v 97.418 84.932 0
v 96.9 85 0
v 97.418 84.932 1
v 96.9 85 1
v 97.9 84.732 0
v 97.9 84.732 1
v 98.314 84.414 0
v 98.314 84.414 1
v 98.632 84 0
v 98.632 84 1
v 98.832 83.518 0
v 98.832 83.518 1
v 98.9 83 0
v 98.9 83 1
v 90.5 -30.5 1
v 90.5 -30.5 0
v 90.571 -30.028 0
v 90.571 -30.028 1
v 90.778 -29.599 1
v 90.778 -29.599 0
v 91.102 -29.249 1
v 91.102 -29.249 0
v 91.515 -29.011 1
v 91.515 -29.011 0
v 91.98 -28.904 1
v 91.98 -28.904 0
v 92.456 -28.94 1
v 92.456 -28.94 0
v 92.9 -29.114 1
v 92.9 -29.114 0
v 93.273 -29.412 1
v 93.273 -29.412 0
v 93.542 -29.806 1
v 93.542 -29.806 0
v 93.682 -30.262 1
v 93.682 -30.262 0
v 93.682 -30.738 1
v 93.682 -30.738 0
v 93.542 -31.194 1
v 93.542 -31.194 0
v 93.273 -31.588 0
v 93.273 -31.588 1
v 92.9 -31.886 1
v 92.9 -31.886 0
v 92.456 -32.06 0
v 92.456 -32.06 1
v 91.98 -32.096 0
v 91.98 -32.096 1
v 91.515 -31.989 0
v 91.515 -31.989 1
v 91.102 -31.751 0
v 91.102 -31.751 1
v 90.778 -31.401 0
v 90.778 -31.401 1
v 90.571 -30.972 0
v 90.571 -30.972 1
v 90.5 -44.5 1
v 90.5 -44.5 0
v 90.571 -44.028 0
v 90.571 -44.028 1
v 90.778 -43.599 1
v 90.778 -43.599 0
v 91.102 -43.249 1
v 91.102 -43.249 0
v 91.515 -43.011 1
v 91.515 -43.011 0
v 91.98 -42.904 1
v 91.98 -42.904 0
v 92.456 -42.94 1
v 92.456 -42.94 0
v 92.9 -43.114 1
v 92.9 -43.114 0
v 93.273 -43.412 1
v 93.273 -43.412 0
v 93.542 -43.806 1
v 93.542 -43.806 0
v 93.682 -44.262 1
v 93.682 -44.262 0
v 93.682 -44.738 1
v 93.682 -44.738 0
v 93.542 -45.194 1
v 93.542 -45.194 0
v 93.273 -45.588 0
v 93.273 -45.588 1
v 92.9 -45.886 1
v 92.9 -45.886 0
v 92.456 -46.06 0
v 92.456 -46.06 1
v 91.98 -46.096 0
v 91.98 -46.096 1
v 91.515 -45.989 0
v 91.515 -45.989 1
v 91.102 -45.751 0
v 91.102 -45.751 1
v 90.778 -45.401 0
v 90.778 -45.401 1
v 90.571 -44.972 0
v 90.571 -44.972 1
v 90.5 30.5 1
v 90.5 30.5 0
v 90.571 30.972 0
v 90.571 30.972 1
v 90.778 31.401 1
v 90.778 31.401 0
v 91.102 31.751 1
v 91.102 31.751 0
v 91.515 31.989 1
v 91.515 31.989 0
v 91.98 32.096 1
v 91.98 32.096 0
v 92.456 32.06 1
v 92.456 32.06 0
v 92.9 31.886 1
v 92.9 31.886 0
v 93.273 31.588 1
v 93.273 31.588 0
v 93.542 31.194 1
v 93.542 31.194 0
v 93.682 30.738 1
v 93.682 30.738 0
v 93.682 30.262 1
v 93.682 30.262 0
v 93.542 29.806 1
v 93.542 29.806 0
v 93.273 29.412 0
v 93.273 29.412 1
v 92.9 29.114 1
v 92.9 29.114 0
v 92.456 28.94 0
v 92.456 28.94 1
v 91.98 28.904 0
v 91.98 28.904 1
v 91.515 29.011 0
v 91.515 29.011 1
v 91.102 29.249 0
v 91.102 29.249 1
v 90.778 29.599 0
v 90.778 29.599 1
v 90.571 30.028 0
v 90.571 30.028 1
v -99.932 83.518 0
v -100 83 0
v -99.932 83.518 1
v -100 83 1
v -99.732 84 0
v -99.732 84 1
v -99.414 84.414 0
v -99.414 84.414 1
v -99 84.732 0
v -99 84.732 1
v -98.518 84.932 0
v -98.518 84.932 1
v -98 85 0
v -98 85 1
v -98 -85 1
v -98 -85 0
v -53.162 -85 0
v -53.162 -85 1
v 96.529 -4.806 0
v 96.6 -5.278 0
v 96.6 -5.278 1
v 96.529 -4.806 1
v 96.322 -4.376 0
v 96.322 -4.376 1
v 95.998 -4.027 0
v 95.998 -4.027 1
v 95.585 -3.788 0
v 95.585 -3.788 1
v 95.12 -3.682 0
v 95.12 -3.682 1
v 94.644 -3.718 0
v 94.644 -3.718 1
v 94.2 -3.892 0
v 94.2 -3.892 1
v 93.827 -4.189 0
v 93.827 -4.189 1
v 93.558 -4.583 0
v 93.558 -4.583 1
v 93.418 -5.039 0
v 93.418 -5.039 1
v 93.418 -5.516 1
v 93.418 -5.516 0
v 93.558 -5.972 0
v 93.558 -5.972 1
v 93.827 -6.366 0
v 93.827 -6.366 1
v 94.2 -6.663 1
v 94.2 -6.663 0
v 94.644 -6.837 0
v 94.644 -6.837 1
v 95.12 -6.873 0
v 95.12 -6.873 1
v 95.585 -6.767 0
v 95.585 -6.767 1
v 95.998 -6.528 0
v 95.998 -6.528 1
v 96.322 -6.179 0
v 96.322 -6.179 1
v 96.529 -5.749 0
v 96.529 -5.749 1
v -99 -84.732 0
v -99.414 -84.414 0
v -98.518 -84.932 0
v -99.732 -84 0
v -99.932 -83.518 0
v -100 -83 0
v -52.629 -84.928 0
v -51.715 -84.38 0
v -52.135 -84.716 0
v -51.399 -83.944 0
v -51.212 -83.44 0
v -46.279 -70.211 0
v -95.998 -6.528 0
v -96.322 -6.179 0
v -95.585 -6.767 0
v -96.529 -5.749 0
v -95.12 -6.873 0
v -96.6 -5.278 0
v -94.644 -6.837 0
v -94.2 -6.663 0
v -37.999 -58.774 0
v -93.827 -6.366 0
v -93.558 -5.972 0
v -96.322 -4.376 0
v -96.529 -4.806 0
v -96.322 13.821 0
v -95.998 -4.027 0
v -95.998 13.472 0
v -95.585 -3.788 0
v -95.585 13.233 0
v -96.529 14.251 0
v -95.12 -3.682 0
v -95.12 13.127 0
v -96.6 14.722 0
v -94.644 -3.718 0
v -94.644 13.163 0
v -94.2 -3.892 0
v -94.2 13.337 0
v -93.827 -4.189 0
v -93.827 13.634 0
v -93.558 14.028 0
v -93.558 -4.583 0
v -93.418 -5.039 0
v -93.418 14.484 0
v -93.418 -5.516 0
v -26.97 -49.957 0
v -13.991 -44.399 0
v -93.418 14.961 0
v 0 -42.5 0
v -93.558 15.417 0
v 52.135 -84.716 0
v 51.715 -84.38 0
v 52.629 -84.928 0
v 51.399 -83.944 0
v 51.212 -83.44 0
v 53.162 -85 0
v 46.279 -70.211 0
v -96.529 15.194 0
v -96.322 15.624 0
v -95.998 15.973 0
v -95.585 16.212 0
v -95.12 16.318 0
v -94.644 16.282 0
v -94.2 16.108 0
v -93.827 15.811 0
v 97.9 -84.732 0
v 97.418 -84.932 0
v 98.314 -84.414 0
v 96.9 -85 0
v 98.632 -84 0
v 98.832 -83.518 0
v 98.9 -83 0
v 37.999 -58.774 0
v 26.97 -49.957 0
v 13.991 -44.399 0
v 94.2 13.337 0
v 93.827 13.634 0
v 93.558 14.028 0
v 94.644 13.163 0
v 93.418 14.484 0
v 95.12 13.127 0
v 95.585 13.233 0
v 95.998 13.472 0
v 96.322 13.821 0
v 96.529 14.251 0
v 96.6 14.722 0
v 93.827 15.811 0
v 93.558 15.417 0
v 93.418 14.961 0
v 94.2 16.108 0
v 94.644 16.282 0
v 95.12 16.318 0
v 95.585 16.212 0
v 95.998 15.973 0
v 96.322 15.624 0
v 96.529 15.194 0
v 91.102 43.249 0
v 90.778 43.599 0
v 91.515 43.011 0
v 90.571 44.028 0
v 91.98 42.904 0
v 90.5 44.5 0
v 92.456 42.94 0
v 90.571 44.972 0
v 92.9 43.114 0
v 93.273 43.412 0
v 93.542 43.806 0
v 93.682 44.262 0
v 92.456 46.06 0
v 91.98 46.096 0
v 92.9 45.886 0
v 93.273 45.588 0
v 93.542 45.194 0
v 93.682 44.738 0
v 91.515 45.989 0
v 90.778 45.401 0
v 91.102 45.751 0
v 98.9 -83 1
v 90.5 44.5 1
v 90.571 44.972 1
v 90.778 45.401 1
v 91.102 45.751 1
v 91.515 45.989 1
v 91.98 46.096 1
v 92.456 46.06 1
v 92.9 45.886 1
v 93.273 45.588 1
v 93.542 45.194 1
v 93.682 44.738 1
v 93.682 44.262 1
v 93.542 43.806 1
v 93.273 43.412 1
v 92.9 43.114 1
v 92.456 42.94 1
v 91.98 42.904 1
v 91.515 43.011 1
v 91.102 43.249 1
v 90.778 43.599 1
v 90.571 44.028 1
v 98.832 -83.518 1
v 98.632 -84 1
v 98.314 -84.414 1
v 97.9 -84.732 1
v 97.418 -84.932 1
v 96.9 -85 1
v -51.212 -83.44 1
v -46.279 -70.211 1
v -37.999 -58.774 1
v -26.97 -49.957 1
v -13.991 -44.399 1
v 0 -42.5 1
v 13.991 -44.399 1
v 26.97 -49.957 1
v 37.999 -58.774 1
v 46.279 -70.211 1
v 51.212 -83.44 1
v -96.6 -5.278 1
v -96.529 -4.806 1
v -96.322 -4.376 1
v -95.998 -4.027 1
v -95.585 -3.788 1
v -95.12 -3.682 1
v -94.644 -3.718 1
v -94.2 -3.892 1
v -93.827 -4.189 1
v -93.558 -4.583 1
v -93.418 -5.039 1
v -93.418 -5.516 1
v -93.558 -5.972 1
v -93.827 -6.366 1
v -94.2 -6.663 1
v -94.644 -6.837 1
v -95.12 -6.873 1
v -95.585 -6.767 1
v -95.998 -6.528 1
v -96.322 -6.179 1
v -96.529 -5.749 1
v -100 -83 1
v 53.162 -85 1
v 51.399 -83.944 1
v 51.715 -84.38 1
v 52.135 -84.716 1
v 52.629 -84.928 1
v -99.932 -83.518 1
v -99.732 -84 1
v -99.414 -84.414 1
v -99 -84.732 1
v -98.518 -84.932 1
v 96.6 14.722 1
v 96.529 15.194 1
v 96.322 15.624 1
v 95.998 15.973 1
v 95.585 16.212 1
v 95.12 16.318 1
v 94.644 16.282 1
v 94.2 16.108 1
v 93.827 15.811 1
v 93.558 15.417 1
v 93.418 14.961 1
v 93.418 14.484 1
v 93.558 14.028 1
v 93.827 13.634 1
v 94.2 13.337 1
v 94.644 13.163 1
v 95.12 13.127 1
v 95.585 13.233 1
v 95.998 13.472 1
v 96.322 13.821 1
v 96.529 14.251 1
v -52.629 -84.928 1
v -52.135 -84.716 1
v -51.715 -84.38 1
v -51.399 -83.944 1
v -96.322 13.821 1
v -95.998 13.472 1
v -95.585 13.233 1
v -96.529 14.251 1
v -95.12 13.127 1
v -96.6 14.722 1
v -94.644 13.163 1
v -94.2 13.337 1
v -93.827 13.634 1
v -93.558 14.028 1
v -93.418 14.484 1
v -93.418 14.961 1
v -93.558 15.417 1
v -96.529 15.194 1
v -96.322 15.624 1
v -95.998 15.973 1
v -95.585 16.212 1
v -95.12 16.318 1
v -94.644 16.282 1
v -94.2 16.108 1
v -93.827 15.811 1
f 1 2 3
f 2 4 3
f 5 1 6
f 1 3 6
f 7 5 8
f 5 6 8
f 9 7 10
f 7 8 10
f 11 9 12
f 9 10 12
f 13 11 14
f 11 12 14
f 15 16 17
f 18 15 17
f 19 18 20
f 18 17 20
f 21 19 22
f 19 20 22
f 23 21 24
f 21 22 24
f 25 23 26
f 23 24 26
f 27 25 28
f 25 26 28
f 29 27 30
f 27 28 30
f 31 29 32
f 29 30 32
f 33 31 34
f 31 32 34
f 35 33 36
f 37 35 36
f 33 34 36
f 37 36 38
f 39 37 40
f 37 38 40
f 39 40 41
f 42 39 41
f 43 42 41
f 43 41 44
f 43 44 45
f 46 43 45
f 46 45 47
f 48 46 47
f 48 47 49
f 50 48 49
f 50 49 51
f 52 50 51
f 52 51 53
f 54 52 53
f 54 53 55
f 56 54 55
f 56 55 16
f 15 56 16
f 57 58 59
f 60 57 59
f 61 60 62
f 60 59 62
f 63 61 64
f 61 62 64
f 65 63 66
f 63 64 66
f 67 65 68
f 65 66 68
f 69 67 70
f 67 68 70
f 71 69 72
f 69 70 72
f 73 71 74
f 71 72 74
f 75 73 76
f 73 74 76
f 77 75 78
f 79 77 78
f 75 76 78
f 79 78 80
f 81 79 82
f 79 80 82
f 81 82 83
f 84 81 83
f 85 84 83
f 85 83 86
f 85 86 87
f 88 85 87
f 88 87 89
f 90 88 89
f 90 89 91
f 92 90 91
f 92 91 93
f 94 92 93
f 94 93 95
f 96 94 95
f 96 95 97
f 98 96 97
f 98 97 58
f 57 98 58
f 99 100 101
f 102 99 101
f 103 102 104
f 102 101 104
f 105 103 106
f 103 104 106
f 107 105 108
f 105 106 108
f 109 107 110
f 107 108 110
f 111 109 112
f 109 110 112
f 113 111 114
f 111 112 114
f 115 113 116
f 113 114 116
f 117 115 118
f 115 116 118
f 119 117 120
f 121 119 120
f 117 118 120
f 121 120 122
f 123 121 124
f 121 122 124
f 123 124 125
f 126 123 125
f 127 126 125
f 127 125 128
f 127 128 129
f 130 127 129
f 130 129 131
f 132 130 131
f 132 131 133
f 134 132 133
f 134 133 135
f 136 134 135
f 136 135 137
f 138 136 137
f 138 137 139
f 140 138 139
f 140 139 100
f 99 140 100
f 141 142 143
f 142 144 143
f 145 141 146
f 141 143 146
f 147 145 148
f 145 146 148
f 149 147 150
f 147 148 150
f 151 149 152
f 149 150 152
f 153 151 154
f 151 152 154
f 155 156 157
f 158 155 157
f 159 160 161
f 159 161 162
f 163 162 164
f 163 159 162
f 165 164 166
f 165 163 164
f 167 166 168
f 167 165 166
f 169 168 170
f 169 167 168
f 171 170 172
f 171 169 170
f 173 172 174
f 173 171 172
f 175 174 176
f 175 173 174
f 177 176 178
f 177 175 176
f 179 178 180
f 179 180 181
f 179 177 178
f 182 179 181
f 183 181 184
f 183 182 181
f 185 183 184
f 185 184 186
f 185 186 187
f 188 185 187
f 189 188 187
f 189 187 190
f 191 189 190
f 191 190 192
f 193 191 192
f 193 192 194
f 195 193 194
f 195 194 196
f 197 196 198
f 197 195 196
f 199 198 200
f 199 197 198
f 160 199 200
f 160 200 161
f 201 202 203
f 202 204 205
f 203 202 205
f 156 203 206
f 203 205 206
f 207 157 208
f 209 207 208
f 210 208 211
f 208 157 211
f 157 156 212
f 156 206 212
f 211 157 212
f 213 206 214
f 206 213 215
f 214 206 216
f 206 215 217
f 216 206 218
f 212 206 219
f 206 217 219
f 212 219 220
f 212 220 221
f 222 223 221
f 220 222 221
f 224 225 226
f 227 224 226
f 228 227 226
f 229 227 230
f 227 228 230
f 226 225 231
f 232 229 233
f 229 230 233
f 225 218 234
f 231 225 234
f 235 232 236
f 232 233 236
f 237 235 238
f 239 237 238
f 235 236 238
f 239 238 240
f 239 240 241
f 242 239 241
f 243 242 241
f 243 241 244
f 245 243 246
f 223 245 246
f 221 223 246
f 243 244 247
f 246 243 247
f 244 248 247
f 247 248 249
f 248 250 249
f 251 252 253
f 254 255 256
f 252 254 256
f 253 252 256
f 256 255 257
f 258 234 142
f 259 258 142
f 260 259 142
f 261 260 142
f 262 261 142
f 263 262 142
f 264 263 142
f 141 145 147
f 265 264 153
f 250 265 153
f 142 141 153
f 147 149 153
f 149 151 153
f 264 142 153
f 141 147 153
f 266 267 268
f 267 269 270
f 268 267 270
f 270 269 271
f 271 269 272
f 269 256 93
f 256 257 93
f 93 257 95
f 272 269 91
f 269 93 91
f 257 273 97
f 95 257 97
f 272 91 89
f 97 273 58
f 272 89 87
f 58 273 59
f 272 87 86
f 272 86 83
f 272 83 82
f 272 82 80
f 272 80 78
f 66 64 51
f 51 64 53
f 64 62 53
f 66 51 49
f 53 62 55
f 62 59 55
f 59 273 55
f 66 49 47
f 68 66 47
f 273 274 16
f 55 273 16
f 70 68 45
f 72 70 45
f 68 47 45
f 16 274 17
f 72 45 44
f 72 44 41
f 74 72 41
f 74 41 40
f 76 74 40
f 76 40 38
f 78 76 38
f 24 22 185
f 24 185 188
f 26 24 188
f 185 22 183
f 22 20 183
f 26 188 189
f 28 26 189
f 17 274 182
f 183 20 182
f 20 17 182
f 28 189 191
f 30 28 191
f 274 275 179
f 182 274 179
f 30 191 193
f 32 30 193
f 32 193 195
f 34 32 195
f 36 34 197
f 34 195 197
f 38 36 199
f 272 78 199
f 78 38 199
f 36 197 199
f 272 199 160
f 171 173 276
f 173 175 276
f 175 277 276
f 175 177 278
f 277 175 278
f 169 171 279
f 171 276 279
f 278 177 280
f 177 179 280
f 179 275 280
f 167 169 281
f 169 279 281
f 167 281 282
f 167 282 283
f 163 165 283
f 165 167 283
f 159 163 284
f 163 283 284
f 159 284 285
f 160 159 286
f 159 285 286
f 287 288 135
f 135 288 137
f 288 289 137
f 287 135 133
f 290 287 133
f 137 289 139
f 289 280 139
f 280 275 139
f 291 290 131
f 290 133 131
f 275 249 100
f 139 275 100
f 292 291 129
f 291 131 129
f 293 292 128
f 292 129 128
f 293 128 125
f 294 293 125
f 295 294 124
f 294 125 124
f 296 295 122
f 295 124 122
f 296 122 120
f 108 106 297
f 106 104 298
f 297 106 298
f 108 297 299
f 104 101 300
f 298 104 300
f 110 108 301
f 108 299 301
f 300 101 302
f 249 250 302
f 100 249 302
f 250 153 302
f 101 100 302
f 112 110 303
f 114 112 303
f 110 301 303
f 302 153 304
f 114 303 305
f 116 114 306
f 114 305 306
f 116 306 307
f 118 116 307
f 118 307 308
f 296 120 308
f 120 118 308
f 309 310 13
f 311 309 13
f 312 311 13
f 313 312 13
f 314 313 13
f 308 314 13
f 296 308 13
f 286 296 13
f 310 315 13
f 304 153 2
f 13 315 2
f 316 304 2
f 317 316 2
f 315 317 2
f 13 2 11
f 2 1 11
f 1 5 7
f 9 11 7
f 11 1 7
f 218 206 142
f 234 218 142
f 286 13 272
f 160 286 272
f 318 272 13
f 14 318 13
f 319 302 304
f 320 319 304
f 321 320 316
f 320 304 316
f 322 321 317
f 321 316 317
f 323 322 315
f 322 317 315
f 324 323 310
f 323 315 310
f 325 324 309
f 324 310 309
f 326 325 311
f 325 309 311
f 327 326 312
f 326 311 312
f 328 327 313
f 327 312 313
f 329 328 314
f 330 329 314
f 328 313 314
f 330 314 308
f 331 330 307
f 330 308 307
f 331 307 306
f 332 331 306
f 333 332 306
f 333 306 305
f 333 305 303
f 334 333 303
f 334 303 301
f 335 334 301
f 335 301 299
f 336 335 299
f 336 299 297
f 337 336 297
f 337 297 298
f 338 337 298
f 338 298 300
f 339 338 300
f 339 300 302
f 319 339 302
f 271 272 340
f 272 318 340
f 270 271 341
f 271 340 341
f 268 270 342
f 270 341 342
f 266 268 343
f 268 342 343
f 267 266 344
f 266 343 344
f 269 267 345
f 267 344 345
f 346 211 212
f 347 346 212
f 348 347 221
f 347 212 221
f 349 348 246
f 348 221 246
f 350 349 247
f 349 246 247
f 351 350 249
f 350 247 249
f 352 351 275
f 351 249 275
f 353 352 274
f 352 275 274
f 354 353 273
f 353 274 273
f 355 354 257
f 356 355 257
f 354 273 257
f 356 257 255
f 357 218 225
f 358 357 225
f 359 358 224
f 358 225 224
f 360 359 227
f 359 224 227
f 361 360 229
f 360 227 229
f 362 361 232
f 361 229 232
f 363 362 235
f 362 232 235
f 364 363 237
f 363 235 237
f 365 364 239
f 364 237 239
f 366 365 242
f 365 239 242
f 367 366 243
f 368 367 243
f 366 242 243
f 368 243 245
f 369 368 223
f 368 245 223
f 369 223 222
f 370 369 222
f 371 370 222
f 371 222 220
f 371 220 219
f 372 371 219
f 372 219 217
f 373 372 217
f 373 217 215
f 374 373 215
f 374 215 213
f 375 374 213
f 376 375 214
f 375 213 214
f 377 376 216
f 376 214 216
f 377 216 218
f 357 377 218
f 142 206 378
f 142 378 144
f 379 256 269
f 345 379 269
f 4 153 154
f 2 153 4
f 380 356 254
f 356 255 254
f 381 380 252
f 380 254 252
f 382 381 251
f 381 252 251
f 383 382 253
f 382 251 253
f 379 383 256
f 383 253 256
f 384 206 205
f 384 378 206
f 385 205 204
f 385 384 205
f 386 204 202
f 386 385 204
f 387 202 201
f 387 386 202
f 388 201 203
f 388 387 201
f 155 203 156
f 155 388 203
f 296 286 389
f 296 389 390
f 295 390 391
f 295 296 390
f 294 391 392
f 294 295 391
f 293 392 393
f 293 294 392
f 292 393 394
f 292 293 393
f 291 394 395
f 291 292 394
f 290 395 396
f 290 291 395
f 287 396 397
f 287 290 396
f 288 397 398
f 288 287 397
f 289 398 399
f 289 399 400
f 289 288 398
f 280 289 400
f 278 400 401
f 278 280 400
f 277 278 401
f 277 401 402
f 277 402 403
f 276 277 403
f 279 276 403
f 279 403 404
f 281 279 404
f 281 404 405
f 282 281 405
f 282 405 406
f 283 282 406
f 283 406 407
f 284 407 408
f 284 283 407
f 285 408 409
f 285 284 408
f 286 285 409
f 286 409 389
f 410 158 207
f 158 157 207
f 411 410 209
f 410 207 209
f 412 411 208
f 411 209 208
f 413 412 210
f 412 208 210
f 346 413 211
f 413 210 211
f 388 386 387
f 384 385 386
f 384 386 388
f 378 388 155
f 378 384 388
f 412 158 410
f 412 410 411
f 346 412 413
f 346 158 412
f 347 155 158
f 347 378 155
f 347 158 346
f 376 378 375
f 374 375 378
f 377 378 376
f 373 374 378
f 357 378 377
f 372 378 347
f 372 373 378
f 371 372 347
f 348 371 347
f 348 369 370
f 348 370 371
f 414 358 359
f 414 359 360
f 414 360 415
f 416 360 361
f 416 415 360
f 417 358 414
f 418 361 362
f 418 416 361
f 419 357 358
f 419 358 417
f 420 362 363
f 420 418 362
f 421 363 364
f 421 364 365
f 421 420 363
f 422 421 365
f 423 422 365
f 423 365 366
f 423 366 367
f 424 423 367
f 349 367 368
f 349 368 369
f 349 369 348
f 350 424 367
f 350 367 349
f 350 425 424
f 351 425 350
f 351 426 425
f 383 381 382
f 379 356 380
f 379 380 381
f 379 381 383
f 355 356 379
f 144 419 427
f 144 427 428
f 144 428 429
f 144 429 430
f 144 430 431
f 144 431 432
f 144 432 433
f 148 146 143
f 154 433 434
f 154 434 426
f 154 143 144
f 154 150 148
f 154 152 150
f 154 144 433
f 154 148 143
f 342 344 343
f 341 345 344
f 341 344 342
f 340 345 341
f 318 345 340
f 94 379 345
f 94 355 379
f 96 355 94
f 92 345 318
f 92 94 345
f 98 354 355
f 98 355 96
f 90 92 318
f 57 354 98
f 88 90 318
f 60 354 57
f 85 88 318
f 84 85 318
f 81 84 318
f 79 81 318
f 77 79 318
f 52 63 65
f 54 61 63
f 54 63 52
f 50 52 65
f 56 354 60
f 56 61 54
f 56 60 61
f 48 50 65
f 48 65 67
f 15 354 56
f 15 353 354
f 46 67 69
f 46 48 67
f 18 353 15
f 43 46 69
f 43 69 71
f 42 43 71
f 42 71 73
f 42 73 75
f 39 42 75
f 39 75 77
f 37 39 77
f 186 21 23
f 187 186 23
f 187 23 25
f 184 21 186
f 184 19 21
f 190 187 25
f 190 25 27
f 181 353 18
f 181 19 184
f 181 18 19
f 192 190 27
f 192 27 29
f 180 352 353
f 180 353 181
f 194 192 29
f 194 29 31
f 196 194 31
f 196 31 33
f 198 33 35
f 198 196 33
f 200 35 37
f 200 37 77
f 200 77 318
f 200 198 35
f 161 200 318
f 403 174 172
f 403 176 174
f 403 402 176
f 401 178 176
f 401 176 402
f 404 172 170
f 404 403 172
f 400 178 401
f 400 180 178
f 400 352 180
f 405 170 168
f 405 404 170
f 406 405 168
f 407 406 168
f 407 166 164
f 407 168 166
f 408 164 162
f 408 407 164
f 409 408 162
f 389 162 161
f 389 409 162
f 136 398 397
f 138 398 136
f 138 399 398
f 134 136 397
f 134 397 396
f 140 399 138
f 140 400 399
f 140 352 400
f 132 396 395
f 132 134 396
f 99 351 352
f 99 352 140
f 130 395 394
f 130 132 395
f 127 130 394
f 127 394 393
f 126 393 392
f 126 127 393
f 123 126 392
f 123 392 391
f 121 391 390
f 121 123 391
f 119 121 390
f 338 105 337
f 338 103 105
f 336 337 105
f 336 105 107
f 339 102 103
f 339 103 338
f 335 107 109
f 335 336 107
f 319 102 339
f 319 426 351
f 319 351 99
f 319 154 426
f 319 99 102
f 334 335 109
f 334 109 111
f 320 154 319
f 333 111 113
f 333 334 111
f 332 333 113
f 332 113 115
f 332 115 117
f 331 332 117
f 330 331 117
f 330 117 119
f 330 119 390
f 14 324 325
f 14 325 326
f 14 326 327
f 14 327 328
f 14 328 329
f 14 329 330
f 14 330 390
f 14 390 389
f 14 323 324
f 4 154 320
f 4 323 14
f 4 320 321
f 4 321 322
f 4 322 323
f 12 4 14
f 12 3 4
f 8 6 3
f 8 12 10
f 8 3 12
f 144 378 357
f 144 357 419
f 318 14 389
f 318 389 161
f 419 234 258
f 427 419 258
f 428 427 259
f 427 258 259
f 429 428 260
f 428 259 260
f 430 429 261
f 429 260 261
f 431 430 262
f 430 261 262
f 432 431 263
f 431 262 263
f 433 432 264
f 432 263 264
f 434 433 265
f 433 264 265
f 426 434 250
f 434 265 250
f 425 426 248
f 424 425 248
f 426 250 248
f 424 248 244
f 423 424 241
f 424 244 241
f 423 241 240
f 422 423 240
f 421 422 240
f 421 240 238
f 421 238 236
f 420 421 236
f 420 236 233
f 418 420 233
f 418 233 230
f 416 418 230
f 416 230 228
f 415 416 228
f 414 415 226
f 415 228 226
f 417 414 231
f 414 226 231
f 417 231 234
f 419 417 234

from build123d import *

# Parameters (mm, degrees)
SKETCH_1_W          = 200
SKETCH_1_H          = 170
EXTRUDE_1_DEPTH     = 1
SKETCH_2_R          = 52.5
CUT_EXTRUDE_1_DEPTH = 2
SKETCH_3_R          = 1.6
CUT_EXTRUDE_2_DEPTH = 1
SKETCH_6_W          = 1.1
SKETCH_6_H          = 170
CUT_EXTRUDE_4_DEPTH = 10
FILLET_1_R          = 2
SKETCH_8_R          = 1.6
CUT_EXTRUDE_5_DEPTH = 10


with BuildPart() as part:
    # 草图1 → 凸台-拉伸1 (new body)
    with BuildSketch(Plane.XY):
        Rectangle(SKETCH_1_W, SKETCH_1_H)
    extrude(amount=EXTRUDE_1_DEPTH)

    # 草图2 → 切除-拉伸1 (cut)
    with BuildSketch(Plane(origin=(0, 0, 0), x_dir=(-1, 0, 0), z_dir=(0, 0, -1))):
        with Locations((0, -95)):
            Circle(SKETCH_2_R)
    extrude(amount=-CUT_EXTRUDE_1_DEPTH, mode=Mode.SUBTRACT)

    # 草图3 → 切除-拉伸2 (cut)
    with BuildSketch(Plane(origin=(0, 0, 0), x_dir=(-1, 0, 0), z_dir=(0, 0, -1))):
        with Locations((95, 14.722484501)):
            Circle(SKETCH_3_R)
        with Locations((95, -5.277515499)):
            Circle(SKETCH_3_R)
    cut_extrude_2 = extrude(amount=-CUT_EXTRUDE_2_DEPTH, mode=Mode.SUBTRACT)

    # 镜向1: 切除-拉伸2 across plane
    add(cut_extrude_2.mirror(Plane(origin=(0, 0, 0), x_dir=(0, 0, 1), z_dir=(1, 0, 0))), mode=Mode.SUBTRACT)

    # 草图6 → 切除-拉伸4 (cut)
    with BuildSketch(Plane(origin=(0, 0, 0), x_dir=(-1, 0, 0), z_dir=(0, 0, -1))):
        with Locations((-99.45, 0)):
            Rectangle(SKETCH_6_W, SKETCH_6_H)
    extrude(amount=-CUT_EXTRUDE_4_DEPTH, mode=Mode.SUBTRACT)

    # 圆角1
    fillet_1_edges = [part.edges().sort_by_distance(p)[0] for p in [
        (51.53882032, -85, 0.5),
        (-51.53882032, -85, 0.5),
        (98.9, 85, 0.5),
        (98.9, -85, 0.5),
        (-100, -85, 0.5),
        (-100, 85, 0.5),
    ]]
    fillet(fillet_1_edges, radius=FILLET_1_R)

    # 草图8 → 切除-拉伸5 (cut)
    with BuildSketch(Plane(origin=(0, 0, 0), x_dir=(-1, 0, 0), z_dir=(0, 0, -1))):
        with Locations((-92.1, 44.5)):
            Circle(SKETCH_8_R)
        with Locations((-92.1, 30.5)):
            Circle(SKETCH_8_R)
        with Locations((-92.1, -30.5)):
            Circle(SKETCH_8_R)
        with Locations((-92.1, -44.5)):
            Circle(SKETCH_8_R)
    extrude(amount=-CUT_EXTRUDE_5_DEPTH, mode=Mode.SUBTRACT)


solid = part.part
